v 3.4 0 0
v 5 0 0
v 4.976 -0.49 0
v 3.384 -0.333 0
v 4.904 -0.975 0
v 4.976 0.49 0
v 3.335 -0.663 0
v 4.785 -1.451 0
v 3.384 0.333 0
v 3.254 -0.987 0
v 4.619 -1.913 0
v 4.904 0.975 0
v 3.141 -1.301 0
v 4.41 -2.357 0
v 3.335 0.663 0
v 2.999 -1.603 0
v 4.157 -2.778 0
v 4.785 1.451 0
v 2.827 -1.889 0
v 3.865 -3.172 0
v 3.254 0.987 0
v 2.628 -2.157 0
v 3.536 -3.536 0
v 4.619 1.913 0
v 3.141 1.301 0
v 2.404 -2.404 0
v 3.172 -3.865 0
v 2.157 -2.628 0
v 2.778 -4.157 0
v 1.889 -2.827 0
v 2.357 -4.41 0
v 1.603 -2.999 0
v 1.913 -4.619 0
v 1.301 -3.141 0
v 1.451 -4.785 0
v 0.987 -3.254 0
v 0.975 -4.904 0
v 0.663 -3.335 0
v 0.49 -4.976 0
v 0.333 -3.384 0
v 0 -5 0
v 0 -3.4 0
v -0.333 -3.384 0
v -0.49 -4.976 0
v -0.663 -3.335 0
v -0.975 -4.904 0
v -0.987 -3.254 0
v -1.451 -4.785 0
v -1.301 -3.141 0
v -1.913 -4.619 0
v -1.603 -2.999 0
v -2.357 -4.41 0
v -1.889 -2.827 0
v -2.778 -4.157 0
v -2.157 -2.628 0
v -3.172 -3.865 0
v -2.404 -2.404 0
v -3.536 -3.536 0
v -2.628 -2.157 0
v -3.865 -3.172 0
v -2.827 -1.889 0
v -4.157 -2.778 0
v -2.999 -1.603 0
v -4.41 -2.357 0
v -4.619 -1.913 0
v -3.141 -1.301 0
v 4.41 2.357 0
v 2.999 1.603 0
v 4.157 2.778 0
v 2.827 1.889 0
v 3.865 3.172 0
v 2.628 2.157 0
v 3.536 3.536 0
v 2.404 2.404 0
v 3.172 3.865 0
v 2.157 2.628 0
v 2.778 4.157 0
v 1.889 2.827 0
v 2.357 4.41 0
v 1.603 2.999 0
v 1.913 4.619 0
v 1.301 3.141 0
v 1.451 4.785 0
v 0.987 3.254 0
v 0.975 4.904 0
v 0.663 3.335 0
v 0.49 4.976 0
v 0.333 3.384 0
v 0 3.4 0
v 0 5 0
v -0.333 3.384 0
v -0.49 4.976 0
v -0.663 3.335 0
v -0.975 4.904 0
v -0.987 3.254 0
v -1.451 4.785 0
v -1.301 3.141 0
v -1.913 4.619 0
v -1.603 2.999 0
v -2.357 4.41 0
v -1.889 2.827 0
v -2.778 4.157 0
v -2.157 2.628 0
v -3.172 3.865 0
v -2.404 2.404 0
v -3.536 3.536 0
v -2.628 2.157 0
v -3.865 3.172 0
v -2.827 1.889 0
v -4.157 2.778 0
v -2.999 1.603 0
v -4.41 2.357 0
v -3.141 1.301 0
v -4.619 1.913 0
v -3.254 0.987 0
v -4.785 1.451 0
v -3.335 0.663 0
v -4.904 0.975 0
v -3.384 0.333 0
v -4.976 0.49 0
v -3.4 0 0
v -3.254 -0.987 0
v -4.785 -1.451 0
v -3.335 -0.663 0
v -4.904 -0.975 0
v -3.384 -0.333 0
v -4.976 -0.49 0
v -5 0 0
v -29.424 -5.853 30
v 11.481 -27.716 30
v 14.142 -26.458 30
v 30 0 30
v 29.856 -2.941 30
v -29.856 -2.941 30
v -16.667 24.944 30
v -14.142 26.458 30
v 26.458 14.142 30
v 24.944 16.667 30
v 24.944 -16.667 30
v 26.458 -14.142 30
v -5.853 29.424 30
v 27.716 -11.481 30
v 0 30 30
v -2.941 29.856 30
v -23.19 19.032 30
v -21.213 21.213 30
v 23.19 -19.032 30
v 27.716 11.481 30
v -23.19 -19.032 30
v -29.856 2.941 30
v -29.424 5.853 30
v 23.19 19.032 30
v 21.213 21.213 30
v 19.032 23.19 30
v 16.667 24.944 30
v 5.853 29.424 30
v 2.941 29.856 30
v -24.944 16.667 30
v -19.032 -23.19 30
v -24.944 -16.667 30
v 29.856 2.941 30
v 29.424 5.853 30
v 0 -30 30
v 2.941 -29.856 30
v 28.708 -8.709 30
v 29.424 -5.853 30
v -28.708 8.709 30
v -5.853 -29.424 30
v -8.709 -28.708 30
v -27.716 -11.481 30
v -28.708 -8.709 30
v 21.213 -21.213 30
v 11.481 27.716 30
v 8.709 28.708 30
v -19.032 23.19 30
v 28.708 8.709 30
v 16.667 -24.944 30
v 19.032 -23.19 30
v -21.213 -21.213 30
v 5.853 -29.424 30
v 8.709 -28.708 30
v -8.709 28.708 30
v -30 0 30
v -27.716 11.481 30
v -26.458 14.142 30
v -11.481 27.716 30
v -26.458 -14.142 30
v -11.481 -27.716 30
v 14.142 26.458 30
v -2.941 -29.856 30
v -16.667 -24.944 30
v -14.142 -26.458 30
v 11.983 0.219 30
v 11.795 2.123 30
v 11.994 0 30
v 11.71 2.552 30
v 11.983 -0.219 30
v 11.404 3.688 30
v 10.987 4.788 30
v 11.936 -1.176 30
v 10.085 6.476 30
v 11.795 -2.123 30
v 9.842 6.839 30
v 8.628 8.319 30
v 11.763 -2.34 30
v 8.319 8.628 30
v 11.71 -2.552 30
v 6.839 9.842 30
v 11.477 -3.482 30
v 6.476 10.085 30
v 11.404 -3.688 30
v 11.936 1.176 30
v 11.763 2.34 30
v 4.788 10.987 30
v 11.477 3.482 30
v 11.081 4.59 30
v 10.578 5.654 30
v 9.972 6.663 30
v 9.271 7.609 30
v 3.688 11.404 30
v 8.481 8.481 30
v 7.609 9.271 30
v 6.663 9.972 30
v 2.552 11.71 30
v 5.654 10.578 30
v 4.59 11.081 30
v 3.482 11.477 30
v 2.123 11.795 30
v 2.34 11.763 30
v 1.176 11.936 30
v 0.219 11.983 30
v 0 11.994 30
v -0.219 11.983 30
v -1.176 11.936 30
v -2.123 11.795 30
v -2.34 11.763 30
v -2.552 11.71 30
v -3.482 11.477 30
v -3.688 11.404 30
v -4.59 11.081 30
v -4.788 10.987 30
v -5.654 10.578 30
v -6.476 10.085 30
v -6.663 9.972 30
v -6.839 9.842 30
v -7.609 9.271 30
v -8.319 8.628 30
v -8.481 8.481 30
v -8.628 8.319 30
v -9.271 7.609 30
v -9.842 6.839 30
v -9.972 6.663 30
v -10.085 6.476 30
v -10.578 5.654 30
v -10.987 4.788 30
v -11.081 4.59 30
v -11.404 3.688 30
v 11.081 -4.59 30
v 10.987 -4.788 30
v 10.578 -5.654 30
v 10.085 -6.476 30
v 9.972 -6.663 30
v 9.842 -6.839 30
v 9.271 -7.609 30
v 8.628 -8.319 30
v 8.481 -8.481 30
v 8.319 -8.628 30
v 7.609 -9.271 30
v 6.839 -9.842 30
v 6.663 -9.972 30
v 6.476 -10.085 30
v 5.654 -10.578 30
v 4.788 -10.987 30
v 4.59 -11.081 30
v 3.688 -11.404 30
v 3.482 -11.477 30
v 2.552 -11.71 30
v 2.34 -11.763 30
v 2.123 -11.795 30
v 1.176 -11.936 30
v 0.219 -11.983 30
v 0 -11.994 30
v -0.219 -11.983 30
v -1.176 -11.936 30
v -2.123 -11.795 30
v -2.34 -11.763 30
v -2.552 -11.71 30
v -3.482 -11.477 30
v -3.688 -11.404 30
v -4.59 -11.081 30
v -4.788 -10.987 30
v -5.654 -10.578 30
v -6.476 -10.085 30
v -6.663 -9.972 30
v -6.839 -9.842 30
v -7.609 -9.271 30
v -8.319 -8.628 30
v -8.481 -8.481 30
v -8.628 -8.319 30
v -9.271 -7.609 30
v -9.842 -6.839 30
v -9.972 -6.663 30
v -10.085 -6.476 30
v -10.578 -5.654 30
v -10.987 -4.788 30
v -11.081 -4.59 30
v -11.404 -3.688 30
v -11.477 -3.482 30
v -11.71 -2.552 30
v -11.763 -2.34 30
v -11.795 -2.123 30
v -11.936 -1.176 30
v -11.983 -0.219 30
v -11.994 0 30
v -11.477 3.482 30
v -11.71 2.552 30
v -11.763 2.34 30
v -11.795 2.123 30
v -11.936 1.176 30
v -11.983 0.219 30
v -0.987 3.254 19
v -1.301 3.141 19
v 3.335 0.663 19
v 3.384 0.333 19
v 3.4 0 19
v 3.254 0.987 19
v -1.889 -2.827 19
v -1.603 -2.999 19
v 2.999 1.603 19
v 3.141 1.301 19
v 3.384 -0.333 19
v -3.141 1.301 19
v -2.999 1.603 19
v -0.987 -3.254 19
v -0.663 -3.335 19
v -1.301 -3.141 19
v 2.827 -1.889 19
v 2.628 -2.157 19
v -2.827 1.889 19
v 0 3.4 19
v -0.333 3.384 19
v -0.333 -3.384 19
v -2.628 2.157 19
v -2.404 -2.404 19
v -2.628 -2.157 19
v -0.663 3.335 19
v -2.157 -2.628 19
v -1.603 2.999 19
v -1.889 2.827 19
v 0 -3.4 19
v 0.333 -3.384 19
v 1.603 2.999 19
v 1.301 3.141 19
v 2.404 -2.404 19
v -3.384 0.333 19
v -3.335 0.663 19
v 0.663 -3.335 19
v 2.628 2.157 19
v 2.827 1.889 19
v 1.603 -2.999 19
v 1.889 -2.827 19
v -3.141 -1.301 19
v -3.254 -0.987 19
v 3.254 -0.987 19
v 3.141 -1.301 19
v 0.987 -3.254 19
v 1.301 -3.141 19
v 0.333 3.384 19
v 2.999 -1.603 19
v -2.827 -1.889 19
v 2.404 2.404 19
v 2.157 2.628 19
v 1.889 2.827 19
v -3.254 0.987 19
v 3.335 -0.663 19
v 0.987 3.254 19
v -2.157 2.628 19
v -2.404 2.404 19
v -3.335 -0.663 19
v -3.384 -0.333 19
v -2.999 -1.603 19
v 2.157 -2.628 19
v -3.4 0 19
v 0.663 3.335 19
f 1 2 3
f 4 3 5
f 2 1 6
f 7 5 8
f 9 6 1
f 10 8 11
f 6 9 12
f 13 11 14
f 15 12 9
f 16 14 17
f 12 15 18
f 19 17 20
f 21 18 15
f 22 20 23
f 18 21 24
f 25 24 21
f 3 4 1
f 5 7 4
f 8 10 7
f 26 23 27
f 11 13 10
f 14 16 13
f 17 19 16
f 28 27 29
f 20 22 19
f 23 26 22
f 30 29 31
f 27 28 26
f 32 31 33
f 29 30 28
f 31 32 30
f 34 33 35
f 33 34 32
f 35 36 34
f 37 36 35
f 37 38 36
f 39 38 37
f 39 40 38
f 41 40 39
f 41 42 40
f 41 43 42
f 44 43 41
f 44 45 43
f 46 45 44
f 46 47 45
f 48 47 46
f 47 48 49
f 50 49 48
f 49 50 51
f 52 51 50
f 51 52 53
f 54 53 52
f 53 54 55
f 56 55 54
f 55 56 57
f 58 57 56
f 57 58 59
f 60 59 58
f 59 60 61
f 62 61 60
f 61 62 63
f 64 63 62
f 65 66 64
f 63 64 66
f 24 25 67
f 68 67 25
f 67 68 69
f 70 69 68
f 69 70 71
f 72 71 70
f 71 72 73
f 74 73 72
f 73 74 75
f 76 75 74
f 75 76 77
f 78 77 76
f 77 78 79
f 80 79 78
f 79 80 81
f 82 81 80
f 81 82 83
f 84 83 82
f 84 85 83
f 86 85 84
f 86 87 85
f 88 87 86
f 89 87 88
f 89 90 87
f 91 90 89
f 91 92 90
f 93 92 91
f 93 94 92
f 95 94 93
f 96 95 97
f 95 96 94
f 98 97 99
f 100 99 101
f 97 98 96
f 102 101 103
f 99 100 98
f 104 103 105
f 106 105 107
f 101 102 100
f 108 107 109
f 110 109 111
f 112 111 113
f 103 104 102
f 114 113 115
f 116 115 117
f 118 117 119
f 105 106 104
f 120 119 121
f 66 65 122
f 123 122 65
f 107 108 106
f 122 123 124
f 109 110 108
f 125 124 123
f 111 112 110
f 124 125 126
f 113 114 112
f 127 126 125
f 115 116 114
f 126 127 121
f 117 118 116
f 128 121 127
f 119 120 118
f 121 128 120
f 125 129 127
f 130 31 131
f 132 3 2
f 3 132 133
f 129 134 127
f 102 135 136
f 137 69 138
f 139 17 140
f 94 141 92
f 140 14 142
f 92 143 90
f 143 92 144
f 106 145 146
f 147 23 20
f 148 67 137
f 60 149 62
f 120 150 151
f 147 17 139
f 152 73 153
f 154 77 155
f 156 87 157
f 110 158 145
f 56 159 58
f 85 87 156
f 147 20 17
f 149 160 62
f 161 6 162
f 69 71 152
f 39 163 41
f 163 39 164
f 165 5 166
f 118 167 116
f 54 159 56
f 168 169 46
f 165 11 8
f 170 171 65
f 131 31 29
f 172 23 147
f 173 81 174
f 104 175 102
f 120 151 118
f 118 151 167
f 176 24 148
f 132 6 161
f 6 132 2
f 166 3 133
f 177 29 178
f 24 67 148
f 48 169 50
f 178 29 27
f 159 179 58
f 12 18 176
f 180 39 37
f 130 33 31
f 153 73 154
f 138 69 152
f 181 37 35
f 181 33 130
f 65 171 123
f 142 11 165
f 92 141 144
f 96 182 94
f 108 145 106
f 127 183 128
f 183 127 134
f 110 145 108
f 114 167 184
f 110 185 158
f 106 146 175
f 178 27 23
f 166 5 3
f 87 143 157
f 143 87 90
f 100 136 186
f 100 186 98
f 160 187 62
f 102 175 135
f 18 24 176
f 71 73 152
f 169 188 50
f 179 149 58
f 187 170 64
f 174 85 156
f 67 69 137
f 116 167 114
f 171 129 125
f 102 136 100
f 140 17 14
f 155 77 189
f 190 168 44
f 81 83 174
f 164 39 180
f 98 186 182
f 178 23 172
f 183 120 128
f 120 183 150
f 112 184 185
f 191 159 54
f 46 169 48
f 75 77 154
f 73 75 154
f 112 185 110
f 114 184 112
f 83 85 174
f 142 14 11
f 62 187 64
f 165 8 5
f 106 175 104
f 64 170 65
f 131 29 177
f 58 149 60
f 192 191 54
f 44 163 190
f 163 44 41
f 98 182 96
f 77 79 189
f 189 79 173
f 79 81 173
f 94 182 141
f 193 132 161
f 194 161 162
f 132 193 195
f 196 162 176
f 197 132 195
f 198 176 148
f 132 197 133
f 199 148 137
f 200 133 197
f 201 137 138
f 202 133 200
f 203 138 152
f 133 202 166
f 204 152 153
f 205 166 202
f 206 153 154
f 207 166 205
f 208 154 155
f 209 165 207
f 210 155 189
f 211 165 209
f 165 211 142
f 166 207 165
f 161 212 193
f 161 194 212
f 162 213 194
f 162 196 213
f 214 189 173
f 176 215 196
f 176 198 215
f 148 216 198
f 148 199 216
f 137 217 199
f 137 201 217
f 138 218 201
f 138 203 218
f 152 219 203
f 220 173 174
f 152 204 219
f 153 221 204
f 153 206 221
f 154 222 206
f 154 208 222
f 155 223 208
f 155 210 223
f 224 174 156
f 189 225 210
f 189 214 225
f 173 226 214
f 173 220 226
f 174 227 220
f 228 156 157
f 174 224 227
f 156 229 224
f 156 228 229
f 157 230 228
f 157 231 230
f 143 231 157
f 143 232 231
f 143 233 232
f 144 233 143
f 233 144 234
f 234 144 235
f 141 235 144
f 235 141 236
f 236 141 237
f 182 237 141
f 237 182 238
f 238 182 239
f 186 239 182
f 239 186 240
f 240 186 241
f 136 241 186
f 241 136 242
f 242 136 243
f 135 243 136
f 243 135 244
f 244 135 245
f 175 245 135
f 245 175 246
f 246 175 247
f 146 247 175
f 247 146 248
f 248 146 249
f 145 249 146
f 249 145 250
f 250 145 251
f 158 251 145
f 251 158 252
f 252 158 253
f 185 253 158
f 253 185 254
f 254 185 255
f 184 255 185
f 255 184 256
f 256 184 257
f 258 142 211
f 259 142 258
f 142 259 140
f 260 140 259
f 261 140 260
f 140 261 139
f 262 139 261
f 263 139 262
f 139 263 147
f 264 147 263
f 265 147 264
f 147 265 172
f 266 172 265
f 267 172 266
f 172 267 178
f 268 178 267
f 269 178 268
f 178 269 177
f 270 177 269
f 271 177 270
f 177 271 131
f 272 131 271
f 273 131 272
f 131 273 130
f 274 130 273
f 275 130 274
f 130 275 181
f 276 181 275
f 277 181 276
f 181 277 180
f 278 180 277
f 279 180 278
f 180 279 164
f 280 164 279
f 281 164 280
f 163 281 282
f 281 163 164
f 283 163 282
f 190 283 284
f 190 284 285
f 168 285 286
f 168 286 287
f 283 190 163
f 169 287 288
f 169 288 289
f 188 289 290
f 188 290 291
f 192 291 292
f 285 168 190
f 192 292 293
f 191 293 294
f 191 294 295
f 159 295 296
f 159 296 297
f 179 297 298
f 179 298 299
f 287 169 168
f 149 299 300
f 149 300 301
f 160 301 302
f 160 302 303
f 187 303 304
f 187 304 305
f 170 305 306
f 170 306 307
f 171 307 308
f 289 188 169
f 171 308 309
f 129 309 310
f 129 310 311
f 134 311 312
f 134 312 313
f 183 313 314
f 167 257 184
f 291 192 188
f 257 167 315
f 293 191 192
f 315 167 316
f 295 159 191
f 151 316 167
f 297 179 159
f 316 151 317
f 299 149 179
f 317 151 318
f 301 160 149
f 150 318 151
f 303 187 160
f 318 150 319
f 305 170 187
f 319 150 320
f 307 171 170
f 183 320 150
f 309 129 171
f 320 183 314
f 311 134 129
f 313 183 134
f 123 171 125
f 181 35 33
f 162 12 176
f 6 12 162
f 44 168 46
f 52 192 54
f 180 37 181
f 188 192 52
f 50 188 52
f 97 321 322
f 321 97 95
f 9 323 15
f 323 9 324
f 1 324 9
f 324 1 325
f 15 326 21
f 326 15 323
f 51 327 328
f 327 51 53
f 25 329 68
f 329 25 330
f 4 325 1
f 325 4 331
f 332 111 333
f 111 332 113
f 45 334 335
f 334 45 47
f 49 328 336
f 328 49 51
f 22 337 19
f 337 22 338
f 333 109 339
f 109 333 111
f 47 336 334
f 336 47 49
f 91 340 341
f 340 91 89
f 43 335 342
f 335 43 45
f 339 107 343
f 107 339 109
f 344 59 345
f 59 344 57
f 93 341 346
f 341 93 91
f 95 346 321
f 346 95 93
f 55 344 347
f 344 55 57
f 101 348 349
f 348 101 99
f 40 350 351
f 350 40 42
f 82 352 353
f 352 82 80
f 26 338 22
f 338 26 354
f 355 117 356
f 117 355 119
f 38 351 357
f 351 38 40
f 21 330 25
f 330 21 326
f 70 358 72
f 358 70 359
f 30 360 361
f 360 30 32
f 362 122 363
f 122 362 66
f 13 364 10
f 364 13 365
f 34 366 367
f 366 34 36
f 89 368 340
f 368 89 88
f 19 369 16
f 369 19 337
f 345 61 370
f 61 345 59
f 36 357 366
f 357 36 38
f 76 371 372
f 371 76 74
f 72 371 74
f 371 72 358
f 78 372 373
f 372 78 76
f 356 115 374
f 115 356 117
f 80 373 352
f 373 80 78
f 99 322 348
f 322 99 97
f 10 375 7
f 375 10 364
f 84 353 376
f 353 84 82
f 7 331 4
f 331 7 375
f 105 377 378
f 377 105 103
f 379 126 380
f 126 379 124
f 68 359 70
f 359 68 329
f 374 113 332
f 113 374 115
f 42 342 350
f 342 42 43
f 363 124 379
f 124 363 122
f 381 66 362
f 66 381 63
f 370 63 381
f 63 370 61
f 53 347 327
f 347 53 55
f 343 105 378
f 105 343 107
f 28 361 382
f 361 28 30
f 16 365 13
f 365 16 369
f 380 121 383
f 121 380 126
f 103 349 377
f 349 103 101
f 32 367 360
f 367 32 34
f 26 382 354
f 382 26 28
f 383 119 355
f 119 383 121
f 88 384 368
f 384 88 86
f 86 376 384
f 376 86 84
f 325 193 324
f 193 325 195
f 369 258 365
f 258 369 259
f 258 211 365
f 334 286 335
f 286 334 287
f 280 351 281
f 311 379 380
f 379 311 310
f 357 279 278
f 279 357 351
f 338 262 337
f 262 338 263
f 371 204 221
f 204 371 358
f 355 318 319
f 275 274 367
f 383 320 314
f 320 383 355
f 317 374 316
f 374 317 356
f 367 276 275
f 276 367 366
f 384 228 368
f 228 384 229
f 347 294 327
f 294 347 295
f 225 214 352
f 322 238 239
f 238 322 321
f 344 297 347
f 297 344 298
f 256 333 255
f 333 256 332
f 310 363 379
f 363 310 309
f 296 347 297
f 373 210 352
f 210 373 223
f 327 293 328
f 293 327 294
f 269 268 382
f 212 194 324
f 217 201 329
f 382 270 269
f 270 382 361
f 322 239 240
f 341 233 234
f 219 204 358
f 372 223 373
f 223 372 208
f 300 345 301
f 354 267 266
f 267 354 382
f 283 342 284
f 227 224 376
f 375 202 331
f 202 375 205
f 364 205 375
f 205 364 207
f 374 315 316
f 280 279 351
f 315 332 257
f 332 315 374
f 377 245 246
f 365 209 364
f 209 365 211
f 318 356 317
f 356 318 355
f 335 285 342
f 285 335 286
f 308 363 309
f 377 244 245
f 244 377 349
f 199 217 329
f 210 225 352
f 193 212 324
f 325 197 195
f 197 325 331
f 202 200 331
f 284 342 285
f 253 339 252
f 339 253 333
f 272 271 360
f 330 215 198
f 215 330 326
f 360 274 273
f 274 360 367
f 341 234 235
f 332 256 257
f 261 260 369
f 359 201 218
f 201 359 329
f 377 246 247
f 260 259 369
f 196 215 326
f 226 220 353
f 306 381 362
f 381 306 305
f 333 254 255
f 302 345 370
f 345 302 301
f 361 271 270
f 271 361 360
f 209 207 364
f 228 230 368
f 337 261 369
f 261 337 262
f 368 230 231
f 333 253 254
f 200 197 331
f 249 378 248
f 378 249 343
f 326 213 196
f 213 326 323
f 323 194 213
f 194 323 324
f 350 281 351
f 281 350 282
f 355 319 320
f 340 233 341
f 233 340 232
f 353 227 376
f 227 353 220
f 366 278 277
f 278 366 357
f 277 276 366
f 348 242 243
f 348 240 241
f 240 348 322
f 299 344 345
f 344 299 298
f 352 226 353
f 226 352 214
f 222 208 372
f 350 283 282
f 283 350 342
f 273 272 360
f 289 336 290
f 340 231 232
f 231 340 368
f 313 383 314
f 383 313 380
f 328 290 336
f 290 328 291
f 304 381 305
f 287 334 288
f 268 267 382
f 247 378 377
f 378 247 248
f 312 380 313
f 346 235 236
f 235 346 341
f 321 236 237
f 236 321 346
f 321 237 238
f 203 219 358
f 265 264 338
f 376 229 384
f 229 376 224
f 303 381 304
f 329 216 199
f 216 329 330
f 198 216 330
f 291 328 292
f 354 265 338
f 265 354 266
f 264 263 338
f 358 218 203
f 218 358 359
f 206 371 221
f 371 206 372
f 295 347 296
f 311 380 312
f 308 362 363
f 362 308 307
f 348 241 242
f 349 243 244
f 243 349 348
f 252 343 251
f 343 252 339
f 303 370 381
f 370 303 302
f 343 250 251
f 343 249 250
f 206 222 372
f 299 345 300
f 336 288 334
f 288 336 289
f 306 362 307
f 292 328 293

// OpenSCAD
// Funnel - a spout (tube) with a conical section widening to a rim, hollow through. NOVEL general part.
//

spout_d  = 10;
spout_l  = 20;
cone_h   = 30;
rim_d    = 60;
wall     = 1.6;

$fn = 64;

ib = max(1.6, spout_d - 2 * wall);   // keep a bore even if the wall comes out too thin

translate([0, 0, 0])
difference() {
    union() {
        cylinder(h = spout_l, d = spout_d);                 // spout (tube)
        cylinder(h = cone_h, d1 = spout_d, d2 = rim_d);     // cone: spout end up to the rim
    }
    translate([0, 0, -1])
        cylinder(h = spout_l + 2, d = ib);                 // bore through the spout
    translate([0, 0, spout_l - 1])
        cylinder(h = cone_h + 2, d1 = ib, d2 = rim_d - 2 * wall);   // bore through the cone (open outlet)
}
